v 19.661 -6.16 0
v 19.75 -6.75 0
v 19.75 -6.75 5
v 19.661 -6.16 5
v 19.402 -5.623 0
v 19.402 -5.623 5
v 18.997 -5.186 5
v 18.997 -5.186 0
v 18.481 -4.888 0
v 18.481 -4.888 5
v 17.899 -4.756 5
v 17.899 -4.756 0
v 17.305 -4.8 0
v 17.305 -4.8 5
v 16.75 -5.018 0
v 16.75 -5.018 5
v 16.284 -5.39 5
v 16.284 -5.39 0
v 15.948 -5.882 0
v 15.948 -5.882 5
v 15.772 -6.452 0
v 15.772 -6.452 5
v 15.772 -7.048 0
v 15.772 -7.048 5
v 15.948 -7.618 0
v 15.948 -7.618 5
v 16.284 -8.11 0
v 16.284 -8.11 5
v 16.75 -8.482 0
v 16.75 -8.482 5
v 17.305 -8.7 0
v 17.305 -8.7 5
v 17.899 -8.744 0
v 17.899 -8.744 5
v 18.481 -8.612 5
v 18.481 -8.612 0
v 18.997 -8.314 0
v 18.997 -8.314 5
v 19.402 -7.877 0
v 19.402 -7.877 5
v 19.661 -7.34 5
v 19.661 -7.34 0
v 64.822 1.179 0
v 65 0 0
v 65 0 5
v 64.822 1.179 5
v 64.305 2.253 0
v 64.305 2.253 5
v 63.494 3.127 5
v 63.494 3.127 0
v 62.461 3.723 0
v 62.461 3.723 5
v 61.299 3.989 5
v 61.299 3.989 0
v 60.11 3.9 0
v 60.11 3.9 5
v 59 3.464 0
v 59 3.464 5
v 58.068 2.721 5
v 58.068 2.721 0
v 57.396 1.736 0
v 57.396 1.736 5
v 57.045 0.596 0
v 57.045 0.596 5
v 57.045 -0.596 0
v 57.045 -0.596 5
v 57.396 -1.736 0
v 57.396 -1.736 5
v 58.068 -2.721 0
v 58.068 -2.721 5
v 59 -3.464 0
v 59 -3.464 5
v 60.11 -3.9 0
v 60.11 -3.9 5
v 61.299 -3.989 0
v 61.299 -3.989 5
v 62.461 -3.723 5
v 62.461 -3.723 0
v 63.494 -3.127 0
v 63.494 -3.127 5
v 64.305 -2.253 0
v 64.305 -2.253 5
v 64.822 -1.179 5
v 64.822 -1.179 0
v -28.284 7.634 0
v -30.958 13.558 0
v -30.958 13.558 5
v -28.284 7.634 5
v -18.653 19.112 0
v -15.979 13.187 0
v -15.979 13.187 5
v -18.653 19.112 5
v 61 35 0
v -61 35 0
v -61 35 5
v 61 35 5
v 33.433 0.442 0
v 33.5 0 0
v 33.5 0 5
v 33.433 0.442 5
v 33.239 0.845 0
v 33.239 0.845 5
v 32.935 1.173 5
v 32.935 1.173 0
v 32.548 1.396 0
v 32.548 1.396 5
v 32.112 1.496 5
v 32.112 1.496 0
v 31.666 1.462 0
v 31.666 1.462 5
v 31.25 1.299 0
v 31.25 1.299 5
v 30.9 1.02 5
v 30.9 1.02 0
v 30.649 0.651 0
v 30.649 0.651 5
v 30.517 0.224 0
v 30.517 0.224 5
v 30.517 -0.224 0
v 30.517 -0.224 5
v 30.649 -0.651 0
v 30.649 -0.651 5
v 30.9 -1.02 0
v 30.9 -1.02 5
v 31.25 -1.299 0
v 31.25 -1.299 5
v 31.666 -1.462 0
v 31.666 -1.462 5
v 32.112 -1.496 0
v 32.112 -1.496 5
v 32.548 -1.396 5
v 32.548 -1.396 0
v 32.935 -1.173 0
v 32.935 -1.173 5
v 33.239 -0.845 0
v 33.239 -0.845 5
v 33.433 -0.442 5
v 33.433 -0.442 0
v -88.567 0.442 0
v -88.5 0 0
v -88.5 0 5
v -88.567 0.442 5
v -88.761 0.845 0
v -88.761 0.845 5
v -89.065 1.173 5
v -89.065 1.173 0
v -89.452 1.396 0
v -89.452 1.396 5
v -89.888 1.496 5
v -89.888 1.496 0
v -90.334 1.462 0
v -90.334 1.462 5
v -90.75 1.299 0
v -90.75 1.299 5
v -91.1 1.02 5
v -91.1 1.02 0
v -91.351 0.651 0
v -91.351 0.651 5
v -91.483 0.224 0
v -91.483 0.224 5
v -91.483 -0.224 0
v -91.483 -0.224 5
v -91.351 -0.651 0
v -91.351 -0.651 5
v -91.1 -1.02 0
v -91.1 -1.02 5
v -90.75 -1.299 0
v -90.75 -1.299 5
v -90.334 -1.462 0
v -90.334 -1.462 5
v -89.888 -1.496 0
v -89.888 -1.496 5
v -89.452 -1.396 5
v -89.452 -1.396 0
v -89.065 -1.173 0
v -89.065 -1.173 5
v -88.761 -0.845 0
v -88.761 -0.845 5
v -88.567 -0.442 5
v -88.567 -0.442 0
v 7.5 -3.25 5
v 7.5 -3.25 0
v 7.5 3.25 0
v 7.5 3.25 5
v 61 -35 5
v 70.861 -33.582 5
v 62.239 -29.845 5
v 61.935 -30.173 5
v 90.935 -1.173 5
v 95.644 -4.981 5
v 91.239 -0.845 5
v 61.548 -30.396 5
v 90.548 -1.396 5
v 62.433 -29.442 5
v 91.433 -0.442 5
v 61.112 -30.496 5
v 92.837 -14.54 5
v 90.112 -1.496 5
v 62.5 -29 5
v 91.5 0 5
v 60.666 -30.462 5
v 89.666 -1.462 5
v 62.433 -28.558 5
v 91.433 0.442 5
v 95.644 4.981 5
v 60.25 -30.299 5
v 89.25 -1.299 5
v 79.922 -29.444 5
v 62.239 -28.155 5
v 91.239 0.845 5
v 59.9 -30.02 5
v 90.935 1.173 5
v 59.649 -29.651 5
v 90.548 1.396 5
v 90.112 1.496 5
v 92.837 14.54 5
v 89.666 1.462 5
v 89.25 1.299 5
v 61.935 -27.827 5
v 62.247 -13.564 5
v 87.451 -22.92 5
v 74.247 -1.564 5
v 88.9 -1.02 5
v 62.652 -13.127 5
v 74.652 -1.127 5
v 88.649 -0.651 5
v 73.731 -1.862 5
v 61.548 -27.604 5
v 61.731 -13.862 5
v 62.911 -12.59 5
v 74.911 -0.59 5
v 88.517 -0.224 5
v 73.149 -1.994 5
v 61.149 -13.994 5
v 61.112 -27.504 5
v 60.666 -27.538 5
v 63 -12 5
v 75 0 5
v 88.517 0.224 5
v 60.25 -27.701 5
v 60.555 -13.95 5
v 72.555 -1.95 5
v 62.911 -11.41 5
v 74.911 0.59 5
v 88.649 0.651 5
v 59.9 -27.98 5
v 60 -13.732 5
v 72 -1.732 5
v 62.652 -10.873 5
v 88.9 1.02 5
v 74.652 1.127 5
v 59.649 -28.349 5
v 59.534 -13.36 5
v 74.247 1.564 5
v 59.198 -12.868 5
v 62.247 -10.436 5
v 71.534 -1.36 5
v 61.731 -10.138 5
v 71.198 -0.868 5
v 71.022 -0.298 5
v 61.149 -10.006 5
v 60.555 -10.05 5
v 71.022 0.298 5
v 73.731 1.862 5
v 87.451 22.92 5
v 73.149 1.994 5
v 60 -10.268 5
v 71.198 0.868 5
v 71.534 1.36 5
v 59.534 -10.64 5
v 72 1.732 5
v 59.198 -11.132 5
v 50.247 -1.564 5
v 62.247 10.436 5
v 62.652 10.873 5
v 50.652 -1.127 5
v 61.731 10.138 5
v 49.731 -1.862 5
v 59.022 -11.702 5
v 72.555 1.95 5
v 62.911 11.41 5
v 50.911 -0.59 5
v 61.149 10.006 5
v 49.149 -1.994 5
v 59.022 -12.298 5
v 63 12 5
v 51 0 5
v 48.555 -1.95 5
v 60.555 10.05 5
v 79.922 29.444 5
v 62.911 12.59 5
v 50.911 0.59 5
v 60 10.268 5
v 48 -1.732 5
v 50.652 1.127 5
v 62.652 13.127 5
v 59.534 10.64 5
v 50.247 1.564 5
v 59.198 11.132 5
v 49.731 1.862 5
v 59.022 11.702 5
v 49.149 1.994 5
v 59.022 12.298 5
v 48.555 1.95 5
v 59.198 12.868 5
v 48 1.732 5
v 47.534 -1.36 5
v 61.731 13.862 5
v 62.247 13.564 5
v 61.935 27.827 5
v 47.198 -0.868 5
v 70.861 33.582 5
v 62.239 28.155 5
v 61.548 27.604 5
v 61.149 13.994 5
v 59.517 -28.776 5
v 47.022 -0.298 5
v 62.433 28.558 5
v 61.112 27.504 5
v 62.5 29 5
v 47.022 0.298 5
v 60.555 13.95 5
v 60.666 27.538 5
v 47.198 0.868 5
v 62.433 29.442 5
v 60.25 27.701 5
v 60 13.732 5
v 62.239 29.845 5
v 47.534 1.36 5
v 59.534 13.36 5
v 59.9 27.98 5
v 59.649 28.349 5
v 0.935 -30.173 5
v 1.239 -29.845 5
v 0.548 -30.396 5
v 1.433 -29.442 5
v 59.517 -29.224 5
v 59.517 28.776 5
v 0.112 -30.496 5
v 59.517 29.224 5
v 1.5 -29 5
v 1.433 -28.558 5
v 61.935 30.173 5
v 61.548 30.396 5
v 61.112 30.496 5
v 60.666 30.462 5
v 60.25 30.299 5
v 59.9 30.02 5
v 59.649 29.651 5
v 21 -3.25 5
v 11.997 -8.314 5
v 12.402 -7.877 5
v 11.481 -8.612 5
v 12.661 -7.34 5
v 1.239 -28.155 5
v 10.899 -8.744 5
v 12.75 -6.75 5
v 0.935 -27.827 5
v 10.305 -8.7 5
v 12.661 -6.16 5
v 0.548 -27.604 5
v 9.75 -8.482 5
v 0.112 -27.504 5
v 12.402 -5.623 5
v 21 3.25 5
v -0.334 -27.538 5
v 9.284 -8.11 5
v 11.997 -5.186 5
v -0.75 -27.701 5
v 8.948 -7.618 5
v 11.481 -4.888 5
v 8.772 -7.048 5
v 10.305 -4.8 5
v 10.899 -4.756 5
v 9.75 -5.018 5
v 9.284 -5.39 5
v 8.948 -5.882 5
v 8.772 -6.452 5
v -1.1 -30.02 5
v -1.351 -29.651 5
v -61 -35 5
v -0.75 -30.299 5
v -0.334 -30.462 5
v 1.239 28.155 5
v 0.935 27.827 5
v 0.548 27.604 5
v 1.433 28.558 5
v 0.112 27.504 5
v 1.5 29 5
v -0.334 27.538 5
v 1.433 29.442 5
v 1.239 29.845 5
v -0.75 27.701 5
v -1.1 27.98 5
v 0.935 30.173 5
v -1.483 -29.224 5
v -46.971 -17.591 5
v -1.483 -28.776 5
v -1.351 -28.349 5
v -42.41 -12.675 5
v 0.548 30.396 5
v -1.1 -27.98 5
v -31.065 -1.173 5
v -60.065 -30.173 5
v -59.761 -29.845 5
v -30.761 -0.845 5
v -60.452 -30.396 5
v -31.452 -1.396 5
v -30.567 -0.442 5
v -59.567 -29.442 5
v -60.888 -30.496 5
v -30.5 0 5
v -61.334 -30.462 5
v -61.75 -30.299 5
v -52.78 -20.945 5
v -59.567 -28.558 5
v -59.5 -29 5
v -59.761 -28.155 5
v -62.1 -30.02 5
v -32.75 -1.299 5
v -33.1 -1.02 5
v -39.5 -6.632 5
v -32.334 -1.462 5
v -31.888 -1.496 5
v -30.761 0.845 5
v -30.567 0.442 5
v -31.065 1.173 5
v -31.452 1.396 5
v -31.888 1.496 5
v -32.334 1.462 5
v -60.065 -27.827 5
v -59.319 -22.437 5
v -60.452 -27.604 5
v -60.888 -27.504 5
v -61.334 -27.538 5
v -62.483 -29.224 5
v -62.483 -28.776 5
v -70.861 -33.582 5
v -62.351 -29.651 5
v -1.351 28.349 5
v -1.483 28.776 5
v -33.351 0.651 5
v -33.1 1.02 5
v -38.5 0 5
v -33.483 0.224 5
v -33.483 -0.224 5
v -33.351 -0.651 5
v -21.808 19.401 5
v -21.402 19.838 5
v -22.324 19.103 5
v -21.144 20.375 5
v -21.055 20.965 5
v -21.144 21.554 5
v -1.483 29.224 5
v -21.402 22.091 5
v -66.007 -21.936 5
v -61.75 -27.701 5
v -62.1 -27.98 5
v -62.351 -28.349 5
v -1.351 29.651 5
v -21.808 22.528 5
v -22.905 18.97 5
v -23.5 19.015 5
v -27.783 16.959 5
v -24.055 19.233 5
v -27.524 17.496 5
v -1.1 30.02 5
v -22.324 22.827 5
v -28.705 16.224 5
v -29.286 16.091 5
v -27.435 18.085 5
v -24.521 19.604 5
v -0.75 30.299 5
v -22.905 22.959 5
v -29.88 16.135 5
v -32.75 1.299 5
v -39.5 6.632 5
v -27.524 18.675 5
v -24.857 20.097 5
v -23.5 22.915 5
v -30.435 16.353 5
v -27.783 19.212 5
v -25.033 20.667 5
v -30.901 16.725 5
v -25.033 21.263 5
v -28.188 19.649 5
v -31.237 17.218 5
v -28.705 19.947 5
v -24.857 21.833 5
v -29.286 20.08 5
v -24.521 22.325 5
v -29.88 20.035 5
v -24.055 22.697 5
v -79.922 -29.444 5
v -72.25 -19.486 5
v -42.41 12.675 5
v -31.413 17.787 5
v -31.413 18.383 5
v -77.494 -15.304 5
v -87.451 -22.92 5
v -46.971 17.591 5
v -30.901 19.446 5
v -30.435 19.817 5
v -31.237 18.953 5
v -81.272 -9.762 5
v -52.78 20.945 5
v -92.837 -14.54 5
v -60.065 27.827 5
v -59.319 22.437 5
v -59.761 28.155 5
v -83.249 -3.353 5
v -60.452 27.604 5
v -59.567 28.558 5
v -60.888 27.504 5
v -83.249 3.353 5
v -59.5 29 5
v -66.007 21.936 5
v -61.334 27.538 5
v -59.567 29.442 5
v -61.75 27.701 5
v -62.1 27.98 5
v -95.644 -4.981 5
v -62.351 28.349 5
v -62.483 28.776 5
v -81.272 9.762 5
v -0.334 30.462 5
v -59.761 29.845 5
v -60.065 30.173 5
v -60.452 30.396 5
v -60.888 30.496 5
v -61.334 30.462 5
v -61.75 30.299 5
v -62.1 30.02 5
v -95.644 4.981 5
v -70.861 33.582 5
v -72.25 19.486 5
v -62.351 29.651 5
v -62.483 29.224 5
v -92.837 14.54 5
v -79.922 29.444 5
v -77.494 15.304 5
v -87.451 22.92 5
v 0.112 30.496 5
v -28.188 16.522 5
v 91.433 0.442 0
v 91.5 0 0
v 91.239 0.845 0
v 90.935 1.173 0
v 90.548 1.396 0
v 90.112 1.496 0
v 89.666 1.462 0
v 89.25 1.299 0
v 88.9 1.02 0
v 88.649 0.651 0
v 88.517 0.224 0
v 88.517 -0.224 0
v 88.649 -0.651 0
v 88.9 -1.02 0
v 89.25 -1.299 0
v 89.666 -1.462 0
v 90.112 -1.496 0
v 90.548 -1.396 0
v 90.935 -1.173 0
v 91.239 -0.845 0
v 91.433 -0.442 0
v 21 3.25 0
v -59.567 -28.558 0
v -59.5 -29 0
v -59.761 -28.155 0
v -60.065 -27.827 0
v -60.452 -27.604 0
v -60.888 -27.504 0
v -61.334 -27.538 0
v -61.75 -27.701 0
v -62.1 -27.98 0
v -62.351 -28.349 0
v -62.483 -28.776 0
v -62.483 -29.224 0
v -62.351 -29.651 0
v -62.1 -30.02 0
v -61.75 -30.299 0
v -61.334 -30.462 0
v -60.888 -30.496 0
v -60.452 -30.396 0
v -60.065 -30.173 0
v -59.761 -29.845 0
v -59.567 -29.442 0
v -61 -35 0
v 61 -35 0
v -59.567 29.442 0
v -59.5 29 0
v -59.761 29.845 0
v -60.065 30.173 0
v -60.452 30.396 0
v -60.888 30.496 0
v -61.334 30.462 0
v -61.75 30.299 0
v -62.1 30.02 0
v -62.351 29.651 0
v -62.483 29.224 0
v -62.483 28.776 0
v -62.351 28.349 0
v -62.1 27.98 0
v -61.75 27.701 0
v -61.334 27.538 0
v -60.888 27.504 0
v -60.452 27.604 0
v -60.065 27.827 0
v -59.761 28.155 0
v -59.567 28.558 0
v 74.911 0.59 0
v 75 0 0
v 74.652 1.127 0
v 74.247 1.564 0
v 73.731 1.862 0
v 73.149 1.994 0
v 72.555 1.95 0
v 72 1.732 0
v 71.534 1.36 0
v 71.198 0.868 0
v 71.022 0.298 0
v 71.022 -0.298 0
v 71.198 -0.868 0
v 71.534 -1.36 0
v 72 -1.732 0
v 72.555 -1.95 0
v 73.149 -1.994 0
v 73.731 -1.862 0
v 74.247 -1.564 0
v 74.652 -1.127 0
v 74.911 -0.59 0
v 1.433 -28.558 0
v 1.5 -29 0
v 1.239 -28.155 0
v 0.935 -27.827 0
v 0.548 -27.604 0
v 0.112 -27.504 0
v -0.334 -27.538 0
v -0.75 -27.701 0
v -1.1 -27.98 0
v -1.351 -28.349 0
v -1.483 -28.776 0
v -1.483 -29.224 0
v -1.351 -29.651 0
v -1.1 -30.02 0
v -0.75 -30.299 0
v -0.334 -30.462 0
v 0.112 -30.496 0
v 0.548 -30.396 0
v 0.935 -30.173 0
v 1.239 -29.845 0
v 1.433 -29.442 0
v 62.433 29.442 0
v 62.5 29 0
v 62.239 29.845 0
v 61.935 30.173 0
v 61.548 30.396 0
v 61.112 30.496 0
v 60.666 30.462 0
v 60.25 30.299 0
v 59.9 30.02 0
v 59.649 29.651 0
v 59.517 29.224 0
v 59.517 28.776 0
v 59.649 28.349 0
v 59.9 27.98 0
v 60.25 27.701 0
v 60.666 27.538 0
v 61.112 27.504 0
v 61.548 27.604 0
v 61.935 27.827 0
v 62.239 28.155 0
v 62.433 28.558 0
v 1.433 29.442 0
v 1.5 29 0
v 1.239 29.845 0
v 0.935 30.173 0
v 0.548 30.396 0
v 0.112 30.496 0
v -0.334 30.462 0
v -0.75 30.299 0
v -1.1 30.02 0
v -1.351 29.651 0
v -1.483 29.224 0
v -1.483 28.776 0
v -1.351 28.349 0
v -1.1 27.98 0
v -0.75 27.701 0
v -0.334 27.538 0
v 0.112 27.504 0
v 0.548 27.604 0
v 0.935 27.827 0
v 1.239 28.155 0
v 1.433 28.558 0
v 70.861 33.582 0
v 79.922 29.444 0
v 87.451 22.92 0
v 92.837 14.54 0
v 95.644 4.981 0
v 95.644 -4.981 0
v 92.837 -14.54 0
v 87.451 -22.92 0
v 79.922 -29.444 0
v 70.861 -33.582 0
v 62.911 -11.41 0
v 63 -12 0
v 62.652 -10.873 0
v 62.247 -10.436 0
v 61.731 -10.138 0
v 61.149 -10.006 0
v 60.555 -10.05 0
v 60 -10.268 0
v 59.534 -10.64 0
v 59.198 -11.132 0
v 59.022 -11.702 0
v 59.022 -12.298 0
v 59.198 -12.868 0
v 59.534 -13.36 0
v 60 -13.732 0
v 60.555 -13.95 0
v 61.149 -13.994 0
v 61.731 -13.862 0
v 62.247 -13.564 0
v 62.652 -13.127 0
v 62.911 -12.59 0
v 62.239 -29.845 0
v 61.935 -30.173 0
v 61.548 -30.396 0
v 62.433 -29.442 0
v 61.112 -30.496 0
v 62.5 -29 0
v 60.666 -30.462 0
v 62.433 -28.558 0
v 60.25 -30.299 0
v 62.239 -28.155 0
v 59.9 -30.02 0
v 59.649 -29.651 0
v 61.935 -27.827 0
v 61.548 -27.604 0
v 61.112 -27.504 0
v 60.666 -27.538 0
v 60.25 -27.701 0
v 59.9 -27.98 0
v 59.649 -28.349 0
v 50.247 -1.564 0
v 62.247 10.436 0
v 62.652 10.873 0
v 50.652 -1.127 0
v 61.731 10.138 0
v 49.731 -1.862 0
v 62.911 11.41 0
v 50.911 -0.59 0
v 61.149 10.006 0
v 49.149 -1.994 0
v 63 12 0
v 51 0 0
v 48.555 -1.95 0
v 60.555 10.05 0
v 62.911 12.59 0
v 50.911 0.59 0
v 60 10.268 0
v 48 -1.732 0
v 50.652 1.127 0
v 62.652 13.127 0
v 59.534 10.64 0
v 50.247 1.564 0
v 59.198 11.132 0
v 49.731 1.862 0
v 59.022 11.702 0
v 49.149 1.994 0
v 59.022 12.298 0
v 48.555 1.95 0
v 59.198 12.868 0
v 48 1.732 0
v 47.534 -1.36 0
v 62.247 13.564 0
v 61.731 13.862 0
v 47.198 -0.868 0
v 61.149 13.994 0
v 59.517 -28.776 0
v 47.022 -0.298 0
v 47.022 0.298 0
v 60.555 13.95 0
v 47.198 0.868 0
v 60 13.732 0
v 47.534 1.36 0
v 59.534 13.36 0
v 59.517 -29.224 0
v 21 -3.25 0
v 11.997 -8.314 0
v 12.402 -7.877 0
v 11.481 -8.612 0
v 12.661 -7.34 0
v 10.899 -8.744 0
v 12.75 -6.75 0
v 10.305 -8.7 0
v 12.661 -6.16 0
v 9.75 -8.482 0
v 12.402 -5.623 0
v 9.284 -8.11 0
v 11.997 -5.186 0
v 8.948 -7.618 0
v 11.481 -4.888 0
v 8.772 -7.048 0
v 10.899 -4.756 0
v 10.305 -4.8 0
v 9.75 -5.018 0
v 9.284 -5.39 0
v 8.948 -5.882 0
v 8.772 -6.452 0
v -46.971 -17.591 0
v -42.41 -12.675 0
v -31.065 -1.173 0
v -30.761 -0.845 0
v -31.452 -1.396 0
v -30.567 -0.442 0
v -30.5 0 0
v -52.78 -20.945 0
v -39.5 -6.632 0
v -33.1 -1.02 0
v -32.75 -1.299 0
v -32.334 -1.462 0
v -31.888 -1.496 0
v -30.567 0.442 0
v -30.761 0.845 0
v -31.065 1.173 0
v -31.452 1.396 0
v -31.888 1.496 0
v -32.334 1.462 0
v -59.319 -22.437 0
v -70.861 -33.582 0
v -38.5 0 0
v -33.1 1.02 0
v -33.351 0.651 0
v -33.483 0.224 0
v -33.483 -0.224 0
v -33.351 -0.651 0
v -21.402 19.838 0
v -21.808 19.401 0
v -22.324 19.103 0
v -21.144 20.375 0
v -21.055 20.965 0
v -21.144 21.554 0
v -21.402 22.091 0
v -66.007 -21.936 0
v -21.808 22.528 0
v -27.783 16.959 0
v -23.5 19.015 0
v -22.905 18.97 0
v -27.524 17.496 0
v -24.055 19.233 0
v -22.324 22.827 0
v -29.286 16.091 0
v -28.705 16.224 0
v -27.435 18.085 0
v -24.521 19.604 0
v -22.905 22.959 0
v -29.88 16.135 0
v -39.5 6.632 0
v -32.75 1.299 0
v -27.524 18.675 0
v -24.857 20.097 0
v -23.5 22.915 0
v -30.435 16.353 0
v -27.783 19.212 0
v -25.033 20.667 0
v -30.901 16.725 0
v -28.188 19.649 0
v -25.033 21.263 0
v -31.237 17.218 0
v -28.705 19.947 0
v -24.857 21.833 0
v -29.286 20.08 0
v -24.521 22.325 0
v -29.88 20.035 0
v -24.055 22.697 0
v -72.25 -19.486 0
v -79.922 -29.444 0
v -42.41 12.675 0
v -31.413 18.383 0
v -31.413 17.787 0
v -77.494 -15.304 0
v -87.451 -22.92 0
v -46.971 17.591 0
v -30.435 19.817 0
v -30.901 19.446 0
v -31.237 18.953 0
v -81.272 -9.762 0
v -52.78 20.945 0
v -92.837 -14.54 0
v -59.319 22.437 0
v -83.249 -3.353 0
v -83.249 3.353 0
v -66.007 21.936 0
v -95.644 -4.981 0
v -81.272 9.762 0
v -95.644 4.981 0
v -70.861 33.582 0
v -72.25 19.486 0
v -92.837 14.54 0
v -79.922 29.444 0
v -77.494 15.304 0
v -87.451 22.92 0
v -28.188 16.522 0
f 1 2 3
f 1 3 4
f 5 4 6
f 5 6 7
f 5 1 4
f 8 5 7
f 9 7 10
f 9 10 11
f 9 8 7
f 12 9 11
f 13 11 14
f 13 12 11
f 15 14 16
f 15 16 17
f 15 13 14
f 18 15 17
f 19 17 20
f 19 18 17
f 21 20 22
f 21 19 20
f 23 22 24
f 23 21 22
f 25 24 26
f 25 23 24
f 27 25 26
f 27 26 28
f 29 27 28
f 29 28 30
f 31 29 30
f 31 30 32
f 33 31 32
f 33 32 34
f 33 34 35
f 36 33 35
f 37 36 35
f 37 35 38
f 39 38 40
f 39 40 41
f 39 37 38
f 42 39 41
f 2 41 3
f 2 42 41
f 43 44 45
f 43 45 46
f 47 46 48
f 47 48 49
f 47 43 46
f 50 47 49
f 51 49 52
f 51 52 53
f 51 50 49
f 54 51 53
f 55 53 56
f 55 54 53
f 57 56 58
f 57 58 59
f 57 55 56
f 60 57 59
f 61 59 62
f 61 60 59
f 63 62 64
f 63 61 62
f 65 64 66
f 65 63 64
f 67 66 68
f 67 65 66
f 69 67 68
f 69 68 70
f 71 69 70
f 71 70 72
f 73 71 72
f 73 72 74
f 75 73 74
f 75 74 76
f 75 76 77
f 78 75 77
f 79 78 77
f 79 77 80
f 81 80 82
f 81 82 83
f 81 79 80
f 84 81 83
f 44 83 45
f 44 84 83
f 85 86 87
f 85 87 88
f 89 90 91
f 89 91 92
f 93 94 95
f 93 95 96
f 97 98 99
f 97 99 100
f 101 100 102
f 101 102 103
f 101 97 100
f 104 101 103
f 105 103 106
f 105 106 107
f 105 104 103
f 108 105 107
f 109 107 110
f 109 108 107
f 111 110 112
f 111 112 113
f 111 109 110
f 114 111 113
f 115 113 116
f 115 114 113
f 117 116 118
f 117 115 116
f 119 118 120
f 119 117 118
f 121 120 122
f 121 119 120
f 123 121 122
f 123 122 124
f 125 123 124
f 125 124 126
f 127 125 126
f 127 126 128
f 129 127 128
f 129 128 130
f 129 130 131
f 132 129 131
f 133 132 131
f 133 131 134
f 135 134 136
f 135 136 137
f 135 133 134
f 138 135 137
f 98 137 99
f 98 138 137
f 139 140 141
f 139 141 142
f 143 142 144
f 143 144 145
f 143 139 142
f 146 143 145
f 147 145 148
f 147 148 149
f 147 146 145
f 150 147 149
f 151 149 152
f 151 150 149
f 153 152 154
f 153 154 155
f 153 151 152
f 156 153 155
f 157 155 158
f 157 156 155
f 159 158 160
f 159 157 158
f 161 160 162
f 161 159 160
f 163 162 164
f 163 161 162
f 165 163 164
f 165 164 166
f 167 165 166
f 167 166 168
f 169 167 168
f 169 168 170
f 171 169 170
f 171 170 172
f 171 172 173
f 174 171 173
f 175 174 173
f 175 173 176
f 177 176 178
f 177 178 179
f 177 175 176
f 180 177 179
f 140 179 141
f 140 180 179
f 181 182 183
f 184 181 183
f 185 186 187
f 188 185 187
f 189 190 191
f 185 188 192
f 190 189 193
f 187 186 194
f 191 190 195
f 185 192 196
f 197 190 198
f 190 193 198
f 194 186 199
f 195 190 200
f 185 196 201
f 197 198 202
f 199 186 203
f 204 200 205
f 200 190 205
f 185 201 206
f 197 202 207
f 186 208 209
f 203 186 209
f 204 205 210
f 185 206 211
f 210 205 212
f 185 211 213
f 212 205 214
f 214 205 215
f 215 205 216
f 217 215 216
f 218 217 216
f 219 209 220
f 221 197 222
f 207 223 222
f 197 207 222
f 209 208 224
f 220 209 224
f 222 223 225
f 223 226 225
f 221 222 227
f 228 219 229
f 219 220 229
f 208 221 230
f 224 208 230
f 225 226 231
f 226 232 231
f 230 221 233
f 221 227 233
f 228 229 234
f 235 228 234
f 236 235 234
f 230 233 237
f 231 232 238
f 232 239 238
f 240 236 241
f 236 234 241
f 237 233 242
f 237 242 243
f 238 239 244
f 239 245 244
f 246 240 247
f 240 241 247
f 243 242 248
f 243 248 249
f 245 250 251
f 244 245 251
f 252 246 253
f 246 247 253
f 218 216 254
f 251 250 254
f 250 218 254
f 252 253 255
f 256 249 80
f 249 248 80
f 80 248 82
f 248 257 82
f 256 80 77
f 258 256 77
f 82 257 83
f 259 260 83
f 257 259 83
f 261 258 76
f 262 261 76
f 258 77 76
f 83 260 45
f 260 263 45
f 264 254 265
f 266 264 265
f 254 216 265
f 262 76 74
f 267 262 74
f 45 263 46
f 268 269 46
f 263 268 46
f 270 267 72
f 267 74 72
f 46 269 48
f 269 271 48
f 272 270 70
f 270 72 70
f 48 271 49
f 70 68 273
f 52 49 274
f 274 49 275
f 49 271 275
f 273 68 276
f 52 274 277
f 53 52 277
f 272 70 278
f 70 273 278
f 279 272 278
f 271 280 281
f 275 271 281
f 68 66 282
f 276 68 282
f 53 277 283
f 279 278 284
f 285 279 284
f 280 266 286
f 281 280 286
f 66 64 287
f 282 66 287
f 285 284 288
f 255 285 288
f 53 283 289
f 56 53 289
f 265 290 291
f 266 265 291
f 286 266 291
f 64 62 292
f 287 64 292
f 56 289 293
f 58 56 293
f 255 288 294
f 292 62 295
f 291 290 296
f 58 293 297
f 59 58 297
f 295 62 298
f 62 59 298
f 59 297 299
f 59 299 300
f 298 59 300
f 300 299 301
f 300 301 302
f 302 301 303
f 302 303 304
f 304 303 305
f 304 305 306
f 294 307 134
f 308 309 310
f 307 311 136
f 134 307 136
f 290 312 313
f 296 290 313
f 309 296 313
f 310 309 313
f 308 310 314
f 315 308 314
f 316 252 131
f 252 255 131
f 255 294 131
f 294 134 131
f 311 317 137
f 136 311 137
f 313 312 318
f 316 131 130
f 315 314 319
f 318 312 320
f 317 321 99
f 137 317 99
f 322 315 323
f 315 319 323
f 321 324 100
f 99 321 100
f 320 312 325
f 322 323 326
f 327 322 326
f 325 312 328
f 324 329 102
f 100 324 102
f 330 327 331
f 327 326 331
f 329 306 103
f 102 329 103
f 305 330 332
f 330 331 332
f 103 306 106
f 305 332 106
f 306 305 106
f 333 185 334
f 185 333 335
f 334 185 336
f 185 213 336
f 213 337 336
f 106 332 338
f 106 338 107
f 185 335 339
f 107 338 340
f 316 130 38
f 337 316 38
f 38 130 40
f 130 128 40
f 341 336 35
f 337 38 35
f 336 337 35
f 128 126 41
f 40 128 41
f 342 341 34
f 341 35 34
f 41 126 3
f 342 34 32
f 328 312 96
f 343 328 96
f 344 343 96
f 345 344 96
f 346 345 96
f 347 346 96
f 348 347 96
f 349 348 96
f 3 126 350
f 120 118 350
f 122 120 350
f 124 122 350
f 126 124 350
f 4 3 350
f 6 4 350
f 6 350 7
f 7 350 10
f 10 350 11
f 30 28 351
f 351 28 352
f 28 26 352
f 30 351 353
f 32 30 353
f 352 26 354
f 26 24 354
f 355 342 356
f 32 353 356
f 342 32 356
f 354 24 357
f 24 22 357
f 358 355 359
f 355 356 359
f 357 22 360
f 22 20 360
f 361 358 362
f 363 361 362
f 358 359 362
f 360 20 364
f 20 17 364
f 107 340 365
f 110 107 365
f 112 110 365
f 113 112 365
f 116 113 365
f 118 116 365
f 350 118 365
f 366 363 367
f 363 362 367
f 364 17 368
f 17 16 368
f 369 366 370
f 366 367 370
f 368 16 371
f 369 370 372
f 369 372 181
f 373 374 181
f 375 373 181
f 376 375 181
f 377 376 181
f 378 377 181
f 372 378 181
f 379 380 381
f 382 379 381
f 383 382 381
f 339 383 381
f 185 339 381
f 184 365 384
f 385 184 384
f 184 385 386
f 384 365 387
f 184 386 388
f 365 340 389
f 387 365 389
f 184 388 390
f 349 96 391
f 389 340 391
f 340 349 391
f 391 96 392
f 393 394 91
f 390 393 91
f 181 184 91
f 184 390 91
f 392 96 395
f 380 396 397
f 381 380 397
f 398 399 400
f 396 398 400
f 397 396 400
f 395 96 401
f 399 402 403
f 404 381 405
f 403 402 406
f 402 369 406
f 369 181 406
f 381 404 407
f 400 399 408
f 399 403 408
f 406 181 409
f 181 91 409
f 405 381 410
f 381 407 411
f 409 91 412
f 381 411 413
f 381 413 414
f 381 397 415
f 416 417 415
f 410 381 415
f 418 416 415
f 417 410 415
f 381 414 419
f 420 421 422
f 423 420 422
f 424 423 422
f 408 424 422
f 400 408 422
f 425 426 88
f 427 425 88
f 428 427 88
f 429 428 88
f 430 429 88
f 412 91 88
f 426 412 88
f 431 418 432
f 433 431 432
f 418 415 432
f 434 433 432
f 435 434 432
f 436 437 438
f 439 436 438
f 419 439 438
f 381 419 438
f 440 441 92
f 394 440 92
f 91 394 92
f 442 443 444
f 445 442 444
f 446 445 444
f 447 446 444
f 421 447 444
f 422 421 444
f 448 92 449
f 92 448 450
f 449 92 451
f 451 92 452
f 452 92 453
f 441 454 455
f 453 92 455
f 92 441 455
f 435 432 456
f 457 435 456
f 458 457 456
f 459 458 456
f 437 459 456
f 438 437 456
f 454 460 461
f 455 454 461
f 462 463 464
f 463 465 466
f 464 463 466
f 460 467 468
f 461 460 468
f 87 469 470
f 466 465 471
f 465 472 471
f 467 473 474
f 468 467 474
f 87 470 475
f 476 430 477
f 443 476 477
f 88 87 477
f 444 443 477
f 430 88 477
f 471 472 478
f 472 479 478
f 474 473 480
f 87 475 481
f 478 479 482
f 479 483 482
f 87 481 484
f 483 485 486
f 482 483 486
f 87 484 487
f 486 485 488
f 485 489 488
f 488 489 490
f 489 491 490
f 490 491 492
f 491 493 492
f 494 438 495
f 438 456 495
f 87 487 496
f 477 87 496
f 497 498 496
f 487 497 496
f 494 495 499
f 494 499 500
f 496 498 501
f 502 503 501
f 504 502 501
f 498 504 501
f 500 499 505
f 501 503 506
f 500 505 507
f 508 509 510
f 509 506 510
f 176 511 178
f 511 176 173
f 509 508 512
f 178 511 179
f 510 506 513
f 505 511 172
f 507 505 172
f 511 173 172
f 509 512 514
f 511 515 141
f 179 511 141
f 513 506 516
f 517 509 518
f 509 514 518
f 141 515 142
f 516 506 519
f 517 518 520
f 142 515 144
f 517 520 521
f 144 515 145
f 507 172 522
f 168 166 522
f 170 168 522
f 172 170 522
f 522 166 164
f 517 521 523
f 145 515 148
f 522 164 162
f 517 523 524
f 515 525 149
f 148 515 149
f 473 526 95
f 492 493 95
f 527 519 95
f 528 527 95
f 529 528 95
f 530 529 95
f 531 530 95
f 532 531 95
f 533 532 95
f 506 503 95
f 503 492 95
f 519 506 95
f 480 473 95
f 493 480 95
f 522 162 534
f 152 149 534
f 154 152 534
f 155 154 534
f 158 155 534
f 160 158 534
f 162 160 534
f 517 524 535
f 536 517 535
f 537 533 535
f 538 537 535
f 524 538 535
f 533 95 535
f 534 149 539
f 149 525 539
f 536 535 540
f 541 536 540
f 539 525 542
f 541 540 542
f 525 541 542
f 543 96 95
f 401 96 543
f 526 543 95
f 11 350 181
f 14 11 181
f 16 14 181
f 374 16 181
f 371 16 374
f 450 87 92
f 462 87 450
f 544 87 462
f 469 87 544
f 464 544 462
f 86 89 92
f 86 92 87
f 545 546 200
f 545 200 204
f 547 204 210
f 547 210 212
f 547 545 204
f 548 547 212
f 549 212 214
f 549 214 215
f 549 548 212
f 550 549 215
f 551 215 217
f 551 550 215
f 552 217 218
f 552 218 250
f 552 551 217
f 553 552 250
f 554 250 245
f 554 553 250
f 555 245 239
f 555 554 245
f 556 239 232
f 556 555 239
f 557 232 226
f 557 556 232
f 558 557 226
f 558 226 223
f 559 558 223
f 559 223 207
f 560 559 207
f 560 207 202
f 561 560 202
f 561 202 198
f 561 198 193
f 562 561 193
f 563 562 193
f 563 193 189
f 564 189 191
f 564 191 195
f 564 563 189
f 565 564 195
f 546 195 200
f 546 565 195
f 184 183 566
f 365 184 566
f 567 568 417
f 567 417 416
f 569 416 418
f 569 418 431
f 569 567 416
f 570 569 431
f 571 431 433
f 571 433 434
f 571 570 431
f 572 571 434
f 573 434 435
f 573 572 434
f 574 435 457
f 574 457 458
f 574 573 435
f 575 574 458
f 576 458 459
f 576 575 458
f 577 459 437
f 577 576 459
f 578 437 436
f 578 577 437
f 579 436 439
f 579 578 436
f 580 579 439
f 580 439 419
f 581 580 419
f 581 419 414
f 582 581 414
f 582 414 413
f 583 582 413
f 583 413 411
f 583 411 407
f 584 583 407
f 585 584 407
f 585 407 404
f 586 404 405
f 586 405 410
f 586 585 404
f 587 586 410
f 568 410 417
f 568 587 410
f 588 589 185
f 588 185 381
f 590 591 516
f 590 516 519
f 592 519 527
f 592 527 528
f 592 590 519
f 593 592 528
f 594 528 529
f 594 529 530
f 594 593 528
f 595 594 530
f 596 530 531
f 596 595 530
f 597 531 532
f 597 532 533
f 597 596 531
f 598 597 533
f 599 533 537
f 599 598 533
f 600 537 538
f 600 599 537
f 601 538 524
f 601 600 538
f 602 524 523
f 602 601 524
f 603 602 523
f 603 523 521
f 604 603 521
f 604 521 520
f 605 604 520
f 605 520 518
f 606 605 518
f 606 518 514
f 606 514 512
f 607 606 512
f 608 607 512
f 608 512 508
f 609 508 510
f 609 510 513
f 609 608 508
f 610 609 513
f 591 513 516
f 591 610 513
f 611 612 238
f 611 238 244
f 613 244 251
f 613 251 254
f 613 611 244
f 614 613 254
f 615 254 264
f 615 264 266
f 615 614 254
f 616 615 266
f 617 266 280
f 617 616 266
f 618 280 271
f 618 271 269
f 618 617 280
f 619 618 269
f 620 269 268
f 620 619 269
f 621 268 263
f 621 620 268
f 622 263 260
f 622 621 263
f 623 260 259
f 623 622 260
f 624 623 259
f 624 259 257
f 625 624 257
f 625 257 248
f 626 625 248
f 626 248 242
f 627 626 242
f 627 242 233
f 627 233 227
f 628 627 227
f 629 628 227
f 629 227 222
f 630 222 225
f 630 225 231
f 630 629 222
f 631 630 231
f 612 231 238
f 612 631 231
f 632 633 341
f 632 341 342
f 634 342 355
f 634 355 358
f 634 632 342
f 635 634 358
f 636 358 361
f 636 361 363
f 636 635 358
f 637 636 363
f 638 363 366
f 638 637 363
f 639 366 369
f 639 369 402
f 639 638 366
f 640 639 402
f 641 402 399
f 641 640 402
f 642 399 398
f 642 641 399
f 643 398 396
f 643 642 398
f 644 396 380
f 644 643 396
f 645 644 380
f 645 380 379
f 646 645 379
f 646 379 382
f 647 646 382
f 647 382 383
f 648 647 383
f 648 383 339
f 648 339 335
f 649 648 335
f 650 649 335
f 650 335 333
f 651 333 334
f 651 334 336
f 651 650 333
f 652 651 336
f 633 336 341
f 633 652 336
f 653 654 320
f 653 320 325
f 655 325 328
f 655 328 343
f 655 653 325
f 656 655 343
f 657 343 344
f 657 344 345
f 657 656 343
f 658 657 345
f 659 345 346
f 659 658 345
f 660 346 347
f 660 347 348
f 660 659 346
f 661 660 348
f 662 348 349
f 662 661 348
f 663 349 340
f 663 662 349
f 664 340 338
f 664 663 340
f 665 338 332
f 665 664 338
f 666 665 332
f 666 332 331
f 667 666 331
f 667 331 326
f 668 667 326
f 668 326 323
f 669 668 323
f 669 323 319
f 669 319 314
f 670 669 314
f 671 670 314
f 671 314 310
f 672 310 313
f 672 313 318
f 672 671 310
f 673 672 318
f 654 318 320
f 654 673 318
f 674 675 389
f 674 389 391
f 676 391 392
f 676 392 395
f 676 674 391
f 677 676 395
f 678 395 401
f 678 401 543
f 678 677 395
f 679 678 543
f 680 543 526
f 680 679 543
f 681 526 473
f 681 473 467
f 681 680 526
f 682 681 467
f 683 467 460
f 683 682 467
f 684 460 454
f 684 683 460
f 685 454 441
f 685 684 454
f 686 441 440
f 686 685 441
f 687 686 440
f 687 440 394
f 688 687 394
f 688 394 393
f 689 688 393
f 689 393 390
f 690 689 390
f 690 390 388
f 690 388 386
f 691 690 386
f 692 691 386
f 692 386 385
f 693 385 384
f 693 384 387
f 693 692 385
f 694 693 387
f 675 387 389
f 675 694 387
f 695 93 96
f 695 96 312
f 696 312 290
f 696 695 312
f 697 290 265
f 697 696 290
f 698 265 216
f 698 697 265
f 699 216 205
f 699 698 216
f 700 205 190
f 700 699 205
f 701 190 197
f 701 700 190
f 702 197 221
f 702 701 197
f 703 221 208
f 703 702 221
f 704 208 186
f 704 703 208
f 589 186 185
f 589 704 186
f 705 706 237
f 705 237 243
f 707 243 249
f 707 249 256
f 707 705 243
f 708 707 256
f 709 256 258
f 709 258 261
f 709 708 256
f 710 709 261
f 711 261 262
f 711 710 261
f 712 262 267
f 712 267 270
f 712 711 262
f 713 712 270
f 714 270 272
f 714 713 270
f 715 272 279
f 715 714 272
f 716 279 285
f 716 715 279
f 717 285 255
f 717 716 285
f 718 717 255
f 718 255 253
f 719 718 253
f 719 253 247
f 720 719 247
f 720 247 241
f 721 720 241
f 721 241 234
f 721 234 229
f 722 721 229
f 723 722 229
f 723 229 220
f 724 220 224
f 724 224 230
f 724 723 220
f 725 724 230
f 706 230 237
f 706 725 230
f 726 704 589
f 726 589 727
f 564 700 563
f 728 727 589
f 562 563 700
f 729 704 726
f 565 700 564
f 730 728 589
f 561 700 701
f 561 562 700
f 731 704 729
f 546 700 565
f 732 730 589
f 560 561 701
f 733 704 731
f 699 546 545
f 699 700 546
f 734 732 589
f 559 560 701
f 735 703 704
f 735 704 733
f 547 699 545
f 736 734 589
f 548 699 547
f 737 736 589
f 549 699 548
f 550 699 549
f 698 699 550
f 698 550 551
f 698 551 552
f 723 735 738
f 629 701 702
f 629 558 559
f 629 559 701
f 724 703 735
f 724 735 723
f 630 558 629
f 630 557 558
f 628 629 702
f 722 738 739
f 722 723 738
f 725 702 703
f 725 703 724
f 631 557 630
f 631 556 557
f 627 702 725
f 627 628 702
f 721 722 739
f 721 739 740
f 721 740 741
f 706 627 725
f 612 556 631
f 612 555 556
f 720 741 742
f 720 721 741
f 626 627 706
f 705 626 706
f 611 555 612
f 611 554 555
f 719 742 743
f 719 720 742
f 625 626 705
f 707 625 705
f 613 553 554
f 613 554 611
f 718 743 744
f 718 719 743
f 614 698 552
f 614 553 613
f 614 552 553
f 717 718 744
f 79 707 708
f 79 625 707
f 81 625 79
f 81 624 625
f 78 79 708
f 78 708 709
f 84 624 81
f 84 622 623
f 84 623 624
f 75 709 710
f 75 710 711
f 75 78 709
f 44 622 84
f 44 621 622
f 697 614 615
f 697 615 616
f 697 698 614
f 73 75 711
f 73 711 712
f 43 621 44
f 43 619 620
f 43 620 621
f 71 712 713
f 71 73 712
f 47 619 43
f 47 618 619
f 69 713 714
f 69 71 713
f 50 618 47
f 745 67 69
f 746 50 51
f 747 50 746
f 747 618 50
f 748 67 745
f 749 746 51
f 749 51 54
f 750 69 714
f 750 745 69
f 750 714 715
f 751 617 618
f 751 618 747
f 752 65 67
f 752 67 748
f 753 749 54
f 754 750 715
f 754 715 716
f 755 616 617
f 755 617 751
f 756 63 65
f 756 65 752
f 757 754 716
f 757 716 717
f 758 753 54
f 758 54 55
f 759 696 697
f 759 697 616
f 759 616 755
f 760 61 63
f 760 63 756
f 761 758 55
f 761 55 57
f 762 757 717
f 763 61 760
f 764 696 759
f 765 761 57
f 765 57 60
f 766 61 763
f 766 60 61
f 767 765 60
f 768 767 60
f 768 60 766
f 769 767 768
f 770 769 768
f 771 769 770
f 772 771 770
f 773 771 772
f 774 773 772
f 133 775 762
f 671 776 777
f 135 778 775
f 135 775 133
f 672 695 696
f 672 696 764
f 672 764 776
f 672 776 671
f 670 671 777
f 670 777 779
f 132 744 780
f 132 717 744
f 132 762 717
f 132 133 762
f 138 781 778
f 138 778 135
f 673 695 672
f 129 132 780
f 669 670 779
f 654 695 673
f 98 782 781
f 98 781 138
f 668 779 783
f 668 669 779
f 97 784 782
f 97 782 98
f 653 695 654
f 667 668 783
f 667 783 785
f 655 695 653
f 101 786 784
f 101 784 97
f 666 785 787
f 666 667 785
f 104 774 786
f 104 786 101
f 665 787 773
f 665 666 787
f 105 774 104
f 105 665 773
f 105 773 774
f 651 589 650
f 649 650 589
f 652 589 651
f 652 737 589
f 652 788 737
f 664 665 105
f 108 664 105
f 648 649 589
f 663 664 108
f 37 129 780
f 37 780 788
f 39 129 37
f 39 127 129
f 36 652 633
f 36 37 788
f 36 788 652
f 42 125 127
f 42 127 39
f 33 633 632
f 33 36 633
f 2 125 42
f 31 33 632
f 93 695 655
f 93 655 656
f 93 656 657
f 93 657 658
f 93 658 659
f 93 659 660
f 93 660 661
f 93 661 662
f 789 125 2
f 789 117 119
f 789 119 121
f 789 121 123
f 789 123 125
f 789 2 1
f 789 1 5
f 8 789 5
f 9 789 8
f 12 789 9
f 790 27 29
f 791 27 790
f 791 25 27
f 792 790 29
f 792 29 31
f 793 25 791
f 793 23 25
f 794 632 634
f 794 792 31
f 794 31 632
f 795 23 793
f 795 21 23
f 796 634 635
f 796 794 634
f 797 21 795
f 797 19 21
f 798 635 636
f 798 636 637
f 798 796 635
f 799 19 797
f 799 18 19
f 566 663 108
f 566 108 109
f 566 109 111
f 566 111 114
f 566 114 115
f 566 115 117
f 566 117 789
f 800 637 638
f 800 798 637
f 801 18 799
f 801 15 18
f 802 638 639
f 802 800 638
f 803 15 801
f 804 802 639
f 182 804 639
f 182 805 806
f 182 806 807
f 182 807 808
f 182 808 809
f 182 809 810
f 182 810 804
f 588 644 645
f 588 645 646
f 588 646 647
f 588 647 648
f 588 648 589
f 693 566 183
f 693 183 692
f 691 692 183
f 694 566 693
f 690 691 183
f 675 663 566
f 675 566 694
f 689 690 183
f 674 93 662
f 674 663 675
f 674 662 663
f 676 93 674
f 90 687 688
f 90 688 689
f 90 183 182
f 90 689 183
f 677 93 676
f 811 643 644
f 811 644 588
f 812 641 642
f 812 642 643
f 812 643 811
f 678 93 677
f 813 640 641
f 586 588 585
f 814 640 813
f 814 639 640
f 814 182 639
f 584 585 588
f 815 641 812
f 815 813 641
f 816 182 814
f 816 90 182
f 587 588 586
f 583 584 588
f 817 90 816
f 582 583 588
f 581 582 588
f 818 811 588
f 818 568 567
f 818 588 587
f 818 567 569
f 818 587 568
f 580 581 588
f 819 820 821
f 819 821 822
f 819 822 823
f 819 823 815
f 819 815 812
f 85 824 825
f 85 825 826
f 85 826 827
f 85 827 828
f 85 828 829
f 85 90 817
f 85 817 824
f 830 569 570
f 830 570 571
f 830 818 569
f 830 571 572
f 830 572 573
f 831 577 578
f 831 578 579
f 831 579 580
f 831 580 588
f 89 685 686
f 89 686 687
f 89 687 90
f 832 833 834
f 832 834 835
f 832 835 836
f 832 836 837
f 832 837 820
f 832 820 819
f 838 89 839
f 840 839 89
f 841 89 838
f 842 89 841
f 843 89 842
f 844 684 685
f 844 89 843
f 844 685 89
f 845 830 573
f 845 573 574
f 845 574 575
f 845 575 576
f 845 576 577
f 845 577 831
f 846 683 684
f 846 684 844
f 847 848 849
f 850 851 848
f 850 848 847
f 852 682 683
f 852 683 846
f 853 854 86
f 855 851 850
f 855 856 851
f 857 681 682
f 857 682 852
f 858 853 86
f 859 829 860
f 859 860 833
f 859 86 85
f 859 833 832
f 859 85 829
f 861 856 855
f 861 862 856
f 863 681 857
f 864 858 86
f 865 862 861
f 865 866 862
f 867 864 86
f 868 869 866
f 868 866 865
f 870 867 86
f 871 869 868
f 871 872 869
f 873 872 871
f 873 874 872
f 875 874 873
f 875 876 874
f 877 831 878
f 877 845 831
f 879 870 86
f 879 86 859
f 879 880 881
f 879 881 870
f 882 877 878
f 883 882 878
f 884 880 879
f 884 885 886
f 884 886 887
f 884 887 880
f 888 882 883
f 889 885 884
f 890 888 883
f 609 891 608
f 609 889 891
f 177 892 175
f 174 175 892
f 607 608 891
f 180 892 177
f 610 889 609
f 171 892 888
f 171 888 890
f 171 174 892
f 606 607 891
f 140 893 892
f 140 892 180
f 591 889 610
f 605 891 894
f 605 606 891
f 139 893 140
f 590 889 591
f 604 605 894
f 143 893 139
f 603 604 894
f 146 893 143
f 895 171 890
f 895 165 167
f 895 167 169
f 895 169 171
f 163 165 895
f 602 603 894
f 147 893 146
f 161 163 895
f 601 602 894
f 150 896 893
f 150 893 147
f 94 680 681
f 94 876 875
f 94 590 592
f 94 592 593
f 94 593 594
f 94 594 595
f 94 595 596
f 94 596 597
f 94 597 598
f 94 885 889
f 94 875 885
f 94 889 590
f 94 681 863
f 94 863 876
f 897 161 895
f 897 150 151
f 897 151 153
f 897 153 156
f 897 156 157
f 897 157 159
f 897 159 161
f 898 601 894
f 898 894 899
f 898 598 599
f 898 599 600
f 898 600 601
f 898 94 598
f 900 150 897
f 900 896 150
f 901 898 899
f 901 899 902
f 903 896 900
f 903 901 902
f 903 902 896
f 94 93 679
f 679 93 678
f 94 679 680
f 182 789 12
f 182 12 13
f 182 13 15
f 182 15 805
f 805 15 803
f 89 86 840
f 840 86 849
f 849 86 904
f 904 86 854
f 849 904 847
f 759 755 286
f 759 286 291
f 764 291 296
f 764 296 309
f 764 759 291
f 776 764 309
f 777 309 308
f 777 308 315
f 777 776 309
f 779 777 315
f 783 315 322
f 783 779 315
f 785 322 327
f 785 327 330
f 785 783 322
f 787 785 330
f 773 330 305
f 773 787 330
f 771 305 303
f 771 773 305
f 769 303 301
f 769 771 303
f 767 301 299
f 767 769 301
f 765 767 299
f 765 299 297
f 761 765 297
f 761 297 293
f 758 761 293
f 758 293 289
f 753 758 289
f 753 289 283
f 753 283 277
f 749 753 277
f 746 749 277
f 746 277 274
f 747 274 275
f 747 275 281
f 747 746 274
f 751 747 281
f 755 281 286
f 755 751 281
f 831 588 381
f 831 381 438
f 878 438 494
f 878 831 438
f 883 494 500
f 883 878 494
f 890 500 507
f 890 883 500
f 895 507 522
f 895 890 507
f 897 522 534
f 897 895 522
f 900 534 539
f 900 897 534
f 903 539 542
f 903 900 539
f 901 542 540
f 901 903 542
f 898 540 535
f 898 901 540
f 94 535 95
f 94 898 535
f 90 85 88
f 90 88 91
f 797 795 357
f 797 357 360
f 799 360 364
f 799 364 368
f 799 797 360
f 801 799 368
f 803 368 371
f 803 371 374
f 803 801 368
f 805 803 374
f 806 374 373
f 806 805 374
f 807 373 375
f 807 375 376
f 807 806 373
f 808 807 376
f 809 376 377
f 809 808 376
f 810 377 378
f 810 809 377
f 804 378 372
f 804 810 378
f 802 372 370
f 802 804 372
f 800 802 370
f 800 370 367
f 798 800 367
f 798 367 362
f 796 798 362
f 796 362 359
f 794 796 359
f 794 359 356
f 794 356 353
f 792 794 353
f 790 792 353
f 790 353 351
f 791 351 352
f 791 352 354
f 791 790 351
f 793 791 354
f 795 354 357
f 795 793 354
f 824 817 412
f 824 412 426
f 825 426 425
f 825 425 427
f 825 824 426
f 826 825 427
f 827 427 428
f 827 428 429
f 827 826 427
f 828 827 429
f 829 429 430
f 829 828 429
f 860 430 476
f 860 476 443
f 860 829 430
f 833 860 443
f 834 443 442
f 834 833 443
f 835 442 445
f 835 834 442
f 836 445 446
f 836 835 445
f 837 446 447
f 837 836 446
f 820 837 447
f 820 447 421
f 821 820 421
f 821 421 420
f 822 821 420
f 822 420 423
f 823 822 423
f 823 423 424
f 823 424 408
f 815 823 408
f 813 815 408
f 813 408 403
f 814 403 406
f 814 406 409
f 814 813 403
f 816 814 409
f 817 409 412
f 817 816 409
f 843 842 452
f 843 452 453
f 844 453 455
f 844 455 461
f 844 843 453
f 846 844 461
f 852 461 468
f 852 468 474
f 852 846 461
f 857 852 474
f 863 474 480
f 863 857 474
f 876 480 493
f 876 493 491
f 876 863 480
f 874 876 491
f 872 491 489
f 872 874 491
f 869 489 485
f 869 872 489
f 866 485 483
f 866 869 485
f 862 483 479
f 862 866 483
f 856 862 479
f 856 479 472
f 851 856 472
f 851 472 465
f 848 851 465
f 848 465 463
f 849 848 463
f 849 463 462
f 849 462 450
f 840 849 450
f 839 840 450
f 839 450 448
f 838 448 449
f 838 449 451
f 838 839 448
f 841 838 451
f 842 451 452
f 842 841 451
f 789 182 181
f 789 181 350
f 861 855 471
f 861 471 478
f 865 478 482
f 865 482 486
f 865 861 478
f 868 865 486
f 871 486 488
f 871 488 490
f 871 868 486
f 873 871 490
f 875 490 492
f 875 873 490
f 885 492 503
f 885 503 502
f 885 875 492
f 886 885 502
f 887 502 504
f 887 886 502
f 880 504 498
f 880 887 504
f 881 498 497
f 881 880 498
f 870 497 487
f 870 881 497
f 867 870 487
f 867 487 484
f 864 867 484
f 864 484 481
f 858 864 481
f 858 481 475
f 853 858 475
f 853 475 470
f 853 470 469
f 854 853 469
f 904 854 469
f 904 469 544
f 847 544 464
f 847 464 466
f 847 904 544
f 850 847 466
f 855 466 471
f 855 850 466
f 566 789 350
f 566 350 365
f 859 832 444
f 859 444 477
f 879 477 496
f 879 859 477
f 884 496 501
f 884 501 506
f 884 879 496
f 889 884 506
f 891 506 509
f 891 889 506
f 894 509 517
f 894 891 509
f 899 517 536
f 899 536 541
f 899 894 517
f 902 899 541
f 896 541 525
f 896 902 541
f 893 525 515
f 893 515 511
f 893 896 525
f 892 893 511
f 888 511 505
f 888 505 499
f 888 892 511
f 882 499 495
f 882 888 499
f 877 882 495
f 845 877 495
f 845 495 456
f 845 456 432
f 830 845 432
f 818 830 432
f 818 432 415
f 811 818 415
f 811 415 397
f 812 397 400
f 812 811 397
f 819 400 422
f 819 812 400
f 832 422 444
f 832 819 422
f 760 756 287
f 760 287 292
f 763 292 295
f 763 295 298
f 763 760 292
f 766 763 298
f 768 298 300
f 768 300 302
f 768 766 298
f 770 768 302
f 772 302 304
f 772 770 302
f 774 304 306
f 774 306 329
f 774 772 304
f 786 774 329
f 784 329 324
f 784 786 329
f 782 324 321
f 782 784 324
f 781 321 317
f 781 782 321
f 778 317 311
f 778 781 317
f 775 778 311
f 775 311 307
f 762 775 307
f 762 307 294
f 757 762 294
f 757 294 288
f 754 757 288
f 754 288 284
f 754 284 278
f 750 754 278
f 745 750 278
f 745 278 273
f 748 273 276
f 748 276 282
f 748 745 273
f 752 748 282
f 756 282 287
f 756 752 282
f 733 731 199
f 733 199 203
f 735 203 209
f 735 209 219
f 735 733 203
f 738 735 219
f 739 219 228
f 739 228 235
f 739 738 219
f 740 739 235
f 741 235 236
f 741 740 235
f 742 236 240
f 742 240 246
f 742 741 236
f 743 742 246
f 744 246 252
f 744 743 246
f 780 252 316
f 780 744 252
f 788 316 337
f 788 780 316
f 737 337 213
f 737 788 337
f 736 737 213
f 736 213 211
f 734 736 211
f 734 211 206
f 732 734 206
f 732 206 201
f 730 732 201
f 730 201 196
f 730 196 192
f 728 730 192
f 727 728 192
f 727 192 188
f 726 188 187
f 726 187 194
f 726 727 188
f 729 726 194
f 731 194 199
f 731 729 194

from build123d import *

# Parameters (mm, degrees)
SKETCH1_R           = 4
SKETCH1_R_2         = 22.5
SKETCH1_R_3         = 1.5
SKETCH1_R_4         = 2
SKETCH1_W           = 13.5
SKETCH1_H           = 6.5
BOSS_EXTRUDE1_DEPTH = 5


with BuildPart() as part:
    # Sketch1 → Boss-Extrude1 (new body)
    with BuildSketch(Plane.XY):
        with BuildLine():
            Line((61, -35), (-61, -35))
            ThreePointArc((-61, -35), (-96, 0), (-61, 35))
            Line((-61, 35), (61, 35))
            ThreePointArc((61, 35), (96, 0), (61, -35))
        make_face()
        with Locations((61, 0)):
            Circle(SKETCH1_R, mode=Mode.SUBTRACT)
        with Locations((-61, 0)):
            Circle(SKETCH1_R_2, mode=Mode.SUBTRACT)
        with Locations((-61, -29)):
            Circle(SKETCH1_R_3, mode=Mode.SUBTRACT)
        with Locations((-61, 29)):
            Circle(SKETCH1_R_3, mode=Mode.SUBTRACT)
        with Locations((61, 29)):
            Circle(SKETCH1_R_3, mode=Mode.SUBTRACT)
        with Locations((61, -29)):
            Circle(SKETCH1_R_3, mode=Mode.SUBTRACT)
        with Locations((0, 29)):
            Circle(SKETCH1_R_3, mode=Mode.SUBTRACT)
        with Locations((-90, 0)):
            Circle(SKETCH1_R_3, mode=Mode.SUBTRACT)
        with Locations((-32, 0)):
            Circle(SKETCH1_R_3, mode=Mode.SUBTRACT)
        with Locations((90, 0)):
            Circle(SKETCH1_R_3, mode=Mode.SUBTRACT)
        with Locations((32, 0)):
            Circle(SKETCH1_R_3, mode=Mode.SUBTRACT)
        with Locations((61, 12)):
            Circle(SKETCH1_R_4, mode=Mode.SUBTRACT)
        with Locations((61, -12)):
            Circle(SKETCH1_R_4, mode=Mode.SUBTRACT)
        with Locations((49, 0)):
            Circle(SKETCH1_R_4, mode=Mode.SUBTRACT)
        with Locations((73, 0)):
            Circle(SKETCH1_R_4, mode=Mode.SUBTRACT)
        with Locations((10.75, -6.75)):
            Circle(SKETCH1_R_4, mode=Mode.SUBTRACT)
        with Locations((17.75, -6.75)):
            Circle(SKETCH1_R_4, mode=Mode.SUBTRACT)
        with Locations((-23.054905042, 20.964824554)):
            Circle(SKETCH1_R_4, mode=Mode.SUBTRACT)
        with Locations((-29.435230641, 18.085337577)):
            Circle(SKETCH1_R_4, mode=Mode.SUBTRACT)
        with Locations((0, -29)):
            Circle(SKETCH1_R_3, mode=Mode.SUBTRACT)
        with Locations((14.25, 0)):
            Rectangle(SKETCH1_W, SKETCH1_H, mode=Mode.SUBTRACT)
        Polygon((-30.95778118, 13.55827011), (-28.283971844, 7.633682054), (-15.979058189, 13.186978367), (-18.652867525, 19.111566423), align=None, mode=Mode.SUBTRACT)
    extrude(amount=BOSS_EXTRUDE1_DEPTH)


solid = part.part
